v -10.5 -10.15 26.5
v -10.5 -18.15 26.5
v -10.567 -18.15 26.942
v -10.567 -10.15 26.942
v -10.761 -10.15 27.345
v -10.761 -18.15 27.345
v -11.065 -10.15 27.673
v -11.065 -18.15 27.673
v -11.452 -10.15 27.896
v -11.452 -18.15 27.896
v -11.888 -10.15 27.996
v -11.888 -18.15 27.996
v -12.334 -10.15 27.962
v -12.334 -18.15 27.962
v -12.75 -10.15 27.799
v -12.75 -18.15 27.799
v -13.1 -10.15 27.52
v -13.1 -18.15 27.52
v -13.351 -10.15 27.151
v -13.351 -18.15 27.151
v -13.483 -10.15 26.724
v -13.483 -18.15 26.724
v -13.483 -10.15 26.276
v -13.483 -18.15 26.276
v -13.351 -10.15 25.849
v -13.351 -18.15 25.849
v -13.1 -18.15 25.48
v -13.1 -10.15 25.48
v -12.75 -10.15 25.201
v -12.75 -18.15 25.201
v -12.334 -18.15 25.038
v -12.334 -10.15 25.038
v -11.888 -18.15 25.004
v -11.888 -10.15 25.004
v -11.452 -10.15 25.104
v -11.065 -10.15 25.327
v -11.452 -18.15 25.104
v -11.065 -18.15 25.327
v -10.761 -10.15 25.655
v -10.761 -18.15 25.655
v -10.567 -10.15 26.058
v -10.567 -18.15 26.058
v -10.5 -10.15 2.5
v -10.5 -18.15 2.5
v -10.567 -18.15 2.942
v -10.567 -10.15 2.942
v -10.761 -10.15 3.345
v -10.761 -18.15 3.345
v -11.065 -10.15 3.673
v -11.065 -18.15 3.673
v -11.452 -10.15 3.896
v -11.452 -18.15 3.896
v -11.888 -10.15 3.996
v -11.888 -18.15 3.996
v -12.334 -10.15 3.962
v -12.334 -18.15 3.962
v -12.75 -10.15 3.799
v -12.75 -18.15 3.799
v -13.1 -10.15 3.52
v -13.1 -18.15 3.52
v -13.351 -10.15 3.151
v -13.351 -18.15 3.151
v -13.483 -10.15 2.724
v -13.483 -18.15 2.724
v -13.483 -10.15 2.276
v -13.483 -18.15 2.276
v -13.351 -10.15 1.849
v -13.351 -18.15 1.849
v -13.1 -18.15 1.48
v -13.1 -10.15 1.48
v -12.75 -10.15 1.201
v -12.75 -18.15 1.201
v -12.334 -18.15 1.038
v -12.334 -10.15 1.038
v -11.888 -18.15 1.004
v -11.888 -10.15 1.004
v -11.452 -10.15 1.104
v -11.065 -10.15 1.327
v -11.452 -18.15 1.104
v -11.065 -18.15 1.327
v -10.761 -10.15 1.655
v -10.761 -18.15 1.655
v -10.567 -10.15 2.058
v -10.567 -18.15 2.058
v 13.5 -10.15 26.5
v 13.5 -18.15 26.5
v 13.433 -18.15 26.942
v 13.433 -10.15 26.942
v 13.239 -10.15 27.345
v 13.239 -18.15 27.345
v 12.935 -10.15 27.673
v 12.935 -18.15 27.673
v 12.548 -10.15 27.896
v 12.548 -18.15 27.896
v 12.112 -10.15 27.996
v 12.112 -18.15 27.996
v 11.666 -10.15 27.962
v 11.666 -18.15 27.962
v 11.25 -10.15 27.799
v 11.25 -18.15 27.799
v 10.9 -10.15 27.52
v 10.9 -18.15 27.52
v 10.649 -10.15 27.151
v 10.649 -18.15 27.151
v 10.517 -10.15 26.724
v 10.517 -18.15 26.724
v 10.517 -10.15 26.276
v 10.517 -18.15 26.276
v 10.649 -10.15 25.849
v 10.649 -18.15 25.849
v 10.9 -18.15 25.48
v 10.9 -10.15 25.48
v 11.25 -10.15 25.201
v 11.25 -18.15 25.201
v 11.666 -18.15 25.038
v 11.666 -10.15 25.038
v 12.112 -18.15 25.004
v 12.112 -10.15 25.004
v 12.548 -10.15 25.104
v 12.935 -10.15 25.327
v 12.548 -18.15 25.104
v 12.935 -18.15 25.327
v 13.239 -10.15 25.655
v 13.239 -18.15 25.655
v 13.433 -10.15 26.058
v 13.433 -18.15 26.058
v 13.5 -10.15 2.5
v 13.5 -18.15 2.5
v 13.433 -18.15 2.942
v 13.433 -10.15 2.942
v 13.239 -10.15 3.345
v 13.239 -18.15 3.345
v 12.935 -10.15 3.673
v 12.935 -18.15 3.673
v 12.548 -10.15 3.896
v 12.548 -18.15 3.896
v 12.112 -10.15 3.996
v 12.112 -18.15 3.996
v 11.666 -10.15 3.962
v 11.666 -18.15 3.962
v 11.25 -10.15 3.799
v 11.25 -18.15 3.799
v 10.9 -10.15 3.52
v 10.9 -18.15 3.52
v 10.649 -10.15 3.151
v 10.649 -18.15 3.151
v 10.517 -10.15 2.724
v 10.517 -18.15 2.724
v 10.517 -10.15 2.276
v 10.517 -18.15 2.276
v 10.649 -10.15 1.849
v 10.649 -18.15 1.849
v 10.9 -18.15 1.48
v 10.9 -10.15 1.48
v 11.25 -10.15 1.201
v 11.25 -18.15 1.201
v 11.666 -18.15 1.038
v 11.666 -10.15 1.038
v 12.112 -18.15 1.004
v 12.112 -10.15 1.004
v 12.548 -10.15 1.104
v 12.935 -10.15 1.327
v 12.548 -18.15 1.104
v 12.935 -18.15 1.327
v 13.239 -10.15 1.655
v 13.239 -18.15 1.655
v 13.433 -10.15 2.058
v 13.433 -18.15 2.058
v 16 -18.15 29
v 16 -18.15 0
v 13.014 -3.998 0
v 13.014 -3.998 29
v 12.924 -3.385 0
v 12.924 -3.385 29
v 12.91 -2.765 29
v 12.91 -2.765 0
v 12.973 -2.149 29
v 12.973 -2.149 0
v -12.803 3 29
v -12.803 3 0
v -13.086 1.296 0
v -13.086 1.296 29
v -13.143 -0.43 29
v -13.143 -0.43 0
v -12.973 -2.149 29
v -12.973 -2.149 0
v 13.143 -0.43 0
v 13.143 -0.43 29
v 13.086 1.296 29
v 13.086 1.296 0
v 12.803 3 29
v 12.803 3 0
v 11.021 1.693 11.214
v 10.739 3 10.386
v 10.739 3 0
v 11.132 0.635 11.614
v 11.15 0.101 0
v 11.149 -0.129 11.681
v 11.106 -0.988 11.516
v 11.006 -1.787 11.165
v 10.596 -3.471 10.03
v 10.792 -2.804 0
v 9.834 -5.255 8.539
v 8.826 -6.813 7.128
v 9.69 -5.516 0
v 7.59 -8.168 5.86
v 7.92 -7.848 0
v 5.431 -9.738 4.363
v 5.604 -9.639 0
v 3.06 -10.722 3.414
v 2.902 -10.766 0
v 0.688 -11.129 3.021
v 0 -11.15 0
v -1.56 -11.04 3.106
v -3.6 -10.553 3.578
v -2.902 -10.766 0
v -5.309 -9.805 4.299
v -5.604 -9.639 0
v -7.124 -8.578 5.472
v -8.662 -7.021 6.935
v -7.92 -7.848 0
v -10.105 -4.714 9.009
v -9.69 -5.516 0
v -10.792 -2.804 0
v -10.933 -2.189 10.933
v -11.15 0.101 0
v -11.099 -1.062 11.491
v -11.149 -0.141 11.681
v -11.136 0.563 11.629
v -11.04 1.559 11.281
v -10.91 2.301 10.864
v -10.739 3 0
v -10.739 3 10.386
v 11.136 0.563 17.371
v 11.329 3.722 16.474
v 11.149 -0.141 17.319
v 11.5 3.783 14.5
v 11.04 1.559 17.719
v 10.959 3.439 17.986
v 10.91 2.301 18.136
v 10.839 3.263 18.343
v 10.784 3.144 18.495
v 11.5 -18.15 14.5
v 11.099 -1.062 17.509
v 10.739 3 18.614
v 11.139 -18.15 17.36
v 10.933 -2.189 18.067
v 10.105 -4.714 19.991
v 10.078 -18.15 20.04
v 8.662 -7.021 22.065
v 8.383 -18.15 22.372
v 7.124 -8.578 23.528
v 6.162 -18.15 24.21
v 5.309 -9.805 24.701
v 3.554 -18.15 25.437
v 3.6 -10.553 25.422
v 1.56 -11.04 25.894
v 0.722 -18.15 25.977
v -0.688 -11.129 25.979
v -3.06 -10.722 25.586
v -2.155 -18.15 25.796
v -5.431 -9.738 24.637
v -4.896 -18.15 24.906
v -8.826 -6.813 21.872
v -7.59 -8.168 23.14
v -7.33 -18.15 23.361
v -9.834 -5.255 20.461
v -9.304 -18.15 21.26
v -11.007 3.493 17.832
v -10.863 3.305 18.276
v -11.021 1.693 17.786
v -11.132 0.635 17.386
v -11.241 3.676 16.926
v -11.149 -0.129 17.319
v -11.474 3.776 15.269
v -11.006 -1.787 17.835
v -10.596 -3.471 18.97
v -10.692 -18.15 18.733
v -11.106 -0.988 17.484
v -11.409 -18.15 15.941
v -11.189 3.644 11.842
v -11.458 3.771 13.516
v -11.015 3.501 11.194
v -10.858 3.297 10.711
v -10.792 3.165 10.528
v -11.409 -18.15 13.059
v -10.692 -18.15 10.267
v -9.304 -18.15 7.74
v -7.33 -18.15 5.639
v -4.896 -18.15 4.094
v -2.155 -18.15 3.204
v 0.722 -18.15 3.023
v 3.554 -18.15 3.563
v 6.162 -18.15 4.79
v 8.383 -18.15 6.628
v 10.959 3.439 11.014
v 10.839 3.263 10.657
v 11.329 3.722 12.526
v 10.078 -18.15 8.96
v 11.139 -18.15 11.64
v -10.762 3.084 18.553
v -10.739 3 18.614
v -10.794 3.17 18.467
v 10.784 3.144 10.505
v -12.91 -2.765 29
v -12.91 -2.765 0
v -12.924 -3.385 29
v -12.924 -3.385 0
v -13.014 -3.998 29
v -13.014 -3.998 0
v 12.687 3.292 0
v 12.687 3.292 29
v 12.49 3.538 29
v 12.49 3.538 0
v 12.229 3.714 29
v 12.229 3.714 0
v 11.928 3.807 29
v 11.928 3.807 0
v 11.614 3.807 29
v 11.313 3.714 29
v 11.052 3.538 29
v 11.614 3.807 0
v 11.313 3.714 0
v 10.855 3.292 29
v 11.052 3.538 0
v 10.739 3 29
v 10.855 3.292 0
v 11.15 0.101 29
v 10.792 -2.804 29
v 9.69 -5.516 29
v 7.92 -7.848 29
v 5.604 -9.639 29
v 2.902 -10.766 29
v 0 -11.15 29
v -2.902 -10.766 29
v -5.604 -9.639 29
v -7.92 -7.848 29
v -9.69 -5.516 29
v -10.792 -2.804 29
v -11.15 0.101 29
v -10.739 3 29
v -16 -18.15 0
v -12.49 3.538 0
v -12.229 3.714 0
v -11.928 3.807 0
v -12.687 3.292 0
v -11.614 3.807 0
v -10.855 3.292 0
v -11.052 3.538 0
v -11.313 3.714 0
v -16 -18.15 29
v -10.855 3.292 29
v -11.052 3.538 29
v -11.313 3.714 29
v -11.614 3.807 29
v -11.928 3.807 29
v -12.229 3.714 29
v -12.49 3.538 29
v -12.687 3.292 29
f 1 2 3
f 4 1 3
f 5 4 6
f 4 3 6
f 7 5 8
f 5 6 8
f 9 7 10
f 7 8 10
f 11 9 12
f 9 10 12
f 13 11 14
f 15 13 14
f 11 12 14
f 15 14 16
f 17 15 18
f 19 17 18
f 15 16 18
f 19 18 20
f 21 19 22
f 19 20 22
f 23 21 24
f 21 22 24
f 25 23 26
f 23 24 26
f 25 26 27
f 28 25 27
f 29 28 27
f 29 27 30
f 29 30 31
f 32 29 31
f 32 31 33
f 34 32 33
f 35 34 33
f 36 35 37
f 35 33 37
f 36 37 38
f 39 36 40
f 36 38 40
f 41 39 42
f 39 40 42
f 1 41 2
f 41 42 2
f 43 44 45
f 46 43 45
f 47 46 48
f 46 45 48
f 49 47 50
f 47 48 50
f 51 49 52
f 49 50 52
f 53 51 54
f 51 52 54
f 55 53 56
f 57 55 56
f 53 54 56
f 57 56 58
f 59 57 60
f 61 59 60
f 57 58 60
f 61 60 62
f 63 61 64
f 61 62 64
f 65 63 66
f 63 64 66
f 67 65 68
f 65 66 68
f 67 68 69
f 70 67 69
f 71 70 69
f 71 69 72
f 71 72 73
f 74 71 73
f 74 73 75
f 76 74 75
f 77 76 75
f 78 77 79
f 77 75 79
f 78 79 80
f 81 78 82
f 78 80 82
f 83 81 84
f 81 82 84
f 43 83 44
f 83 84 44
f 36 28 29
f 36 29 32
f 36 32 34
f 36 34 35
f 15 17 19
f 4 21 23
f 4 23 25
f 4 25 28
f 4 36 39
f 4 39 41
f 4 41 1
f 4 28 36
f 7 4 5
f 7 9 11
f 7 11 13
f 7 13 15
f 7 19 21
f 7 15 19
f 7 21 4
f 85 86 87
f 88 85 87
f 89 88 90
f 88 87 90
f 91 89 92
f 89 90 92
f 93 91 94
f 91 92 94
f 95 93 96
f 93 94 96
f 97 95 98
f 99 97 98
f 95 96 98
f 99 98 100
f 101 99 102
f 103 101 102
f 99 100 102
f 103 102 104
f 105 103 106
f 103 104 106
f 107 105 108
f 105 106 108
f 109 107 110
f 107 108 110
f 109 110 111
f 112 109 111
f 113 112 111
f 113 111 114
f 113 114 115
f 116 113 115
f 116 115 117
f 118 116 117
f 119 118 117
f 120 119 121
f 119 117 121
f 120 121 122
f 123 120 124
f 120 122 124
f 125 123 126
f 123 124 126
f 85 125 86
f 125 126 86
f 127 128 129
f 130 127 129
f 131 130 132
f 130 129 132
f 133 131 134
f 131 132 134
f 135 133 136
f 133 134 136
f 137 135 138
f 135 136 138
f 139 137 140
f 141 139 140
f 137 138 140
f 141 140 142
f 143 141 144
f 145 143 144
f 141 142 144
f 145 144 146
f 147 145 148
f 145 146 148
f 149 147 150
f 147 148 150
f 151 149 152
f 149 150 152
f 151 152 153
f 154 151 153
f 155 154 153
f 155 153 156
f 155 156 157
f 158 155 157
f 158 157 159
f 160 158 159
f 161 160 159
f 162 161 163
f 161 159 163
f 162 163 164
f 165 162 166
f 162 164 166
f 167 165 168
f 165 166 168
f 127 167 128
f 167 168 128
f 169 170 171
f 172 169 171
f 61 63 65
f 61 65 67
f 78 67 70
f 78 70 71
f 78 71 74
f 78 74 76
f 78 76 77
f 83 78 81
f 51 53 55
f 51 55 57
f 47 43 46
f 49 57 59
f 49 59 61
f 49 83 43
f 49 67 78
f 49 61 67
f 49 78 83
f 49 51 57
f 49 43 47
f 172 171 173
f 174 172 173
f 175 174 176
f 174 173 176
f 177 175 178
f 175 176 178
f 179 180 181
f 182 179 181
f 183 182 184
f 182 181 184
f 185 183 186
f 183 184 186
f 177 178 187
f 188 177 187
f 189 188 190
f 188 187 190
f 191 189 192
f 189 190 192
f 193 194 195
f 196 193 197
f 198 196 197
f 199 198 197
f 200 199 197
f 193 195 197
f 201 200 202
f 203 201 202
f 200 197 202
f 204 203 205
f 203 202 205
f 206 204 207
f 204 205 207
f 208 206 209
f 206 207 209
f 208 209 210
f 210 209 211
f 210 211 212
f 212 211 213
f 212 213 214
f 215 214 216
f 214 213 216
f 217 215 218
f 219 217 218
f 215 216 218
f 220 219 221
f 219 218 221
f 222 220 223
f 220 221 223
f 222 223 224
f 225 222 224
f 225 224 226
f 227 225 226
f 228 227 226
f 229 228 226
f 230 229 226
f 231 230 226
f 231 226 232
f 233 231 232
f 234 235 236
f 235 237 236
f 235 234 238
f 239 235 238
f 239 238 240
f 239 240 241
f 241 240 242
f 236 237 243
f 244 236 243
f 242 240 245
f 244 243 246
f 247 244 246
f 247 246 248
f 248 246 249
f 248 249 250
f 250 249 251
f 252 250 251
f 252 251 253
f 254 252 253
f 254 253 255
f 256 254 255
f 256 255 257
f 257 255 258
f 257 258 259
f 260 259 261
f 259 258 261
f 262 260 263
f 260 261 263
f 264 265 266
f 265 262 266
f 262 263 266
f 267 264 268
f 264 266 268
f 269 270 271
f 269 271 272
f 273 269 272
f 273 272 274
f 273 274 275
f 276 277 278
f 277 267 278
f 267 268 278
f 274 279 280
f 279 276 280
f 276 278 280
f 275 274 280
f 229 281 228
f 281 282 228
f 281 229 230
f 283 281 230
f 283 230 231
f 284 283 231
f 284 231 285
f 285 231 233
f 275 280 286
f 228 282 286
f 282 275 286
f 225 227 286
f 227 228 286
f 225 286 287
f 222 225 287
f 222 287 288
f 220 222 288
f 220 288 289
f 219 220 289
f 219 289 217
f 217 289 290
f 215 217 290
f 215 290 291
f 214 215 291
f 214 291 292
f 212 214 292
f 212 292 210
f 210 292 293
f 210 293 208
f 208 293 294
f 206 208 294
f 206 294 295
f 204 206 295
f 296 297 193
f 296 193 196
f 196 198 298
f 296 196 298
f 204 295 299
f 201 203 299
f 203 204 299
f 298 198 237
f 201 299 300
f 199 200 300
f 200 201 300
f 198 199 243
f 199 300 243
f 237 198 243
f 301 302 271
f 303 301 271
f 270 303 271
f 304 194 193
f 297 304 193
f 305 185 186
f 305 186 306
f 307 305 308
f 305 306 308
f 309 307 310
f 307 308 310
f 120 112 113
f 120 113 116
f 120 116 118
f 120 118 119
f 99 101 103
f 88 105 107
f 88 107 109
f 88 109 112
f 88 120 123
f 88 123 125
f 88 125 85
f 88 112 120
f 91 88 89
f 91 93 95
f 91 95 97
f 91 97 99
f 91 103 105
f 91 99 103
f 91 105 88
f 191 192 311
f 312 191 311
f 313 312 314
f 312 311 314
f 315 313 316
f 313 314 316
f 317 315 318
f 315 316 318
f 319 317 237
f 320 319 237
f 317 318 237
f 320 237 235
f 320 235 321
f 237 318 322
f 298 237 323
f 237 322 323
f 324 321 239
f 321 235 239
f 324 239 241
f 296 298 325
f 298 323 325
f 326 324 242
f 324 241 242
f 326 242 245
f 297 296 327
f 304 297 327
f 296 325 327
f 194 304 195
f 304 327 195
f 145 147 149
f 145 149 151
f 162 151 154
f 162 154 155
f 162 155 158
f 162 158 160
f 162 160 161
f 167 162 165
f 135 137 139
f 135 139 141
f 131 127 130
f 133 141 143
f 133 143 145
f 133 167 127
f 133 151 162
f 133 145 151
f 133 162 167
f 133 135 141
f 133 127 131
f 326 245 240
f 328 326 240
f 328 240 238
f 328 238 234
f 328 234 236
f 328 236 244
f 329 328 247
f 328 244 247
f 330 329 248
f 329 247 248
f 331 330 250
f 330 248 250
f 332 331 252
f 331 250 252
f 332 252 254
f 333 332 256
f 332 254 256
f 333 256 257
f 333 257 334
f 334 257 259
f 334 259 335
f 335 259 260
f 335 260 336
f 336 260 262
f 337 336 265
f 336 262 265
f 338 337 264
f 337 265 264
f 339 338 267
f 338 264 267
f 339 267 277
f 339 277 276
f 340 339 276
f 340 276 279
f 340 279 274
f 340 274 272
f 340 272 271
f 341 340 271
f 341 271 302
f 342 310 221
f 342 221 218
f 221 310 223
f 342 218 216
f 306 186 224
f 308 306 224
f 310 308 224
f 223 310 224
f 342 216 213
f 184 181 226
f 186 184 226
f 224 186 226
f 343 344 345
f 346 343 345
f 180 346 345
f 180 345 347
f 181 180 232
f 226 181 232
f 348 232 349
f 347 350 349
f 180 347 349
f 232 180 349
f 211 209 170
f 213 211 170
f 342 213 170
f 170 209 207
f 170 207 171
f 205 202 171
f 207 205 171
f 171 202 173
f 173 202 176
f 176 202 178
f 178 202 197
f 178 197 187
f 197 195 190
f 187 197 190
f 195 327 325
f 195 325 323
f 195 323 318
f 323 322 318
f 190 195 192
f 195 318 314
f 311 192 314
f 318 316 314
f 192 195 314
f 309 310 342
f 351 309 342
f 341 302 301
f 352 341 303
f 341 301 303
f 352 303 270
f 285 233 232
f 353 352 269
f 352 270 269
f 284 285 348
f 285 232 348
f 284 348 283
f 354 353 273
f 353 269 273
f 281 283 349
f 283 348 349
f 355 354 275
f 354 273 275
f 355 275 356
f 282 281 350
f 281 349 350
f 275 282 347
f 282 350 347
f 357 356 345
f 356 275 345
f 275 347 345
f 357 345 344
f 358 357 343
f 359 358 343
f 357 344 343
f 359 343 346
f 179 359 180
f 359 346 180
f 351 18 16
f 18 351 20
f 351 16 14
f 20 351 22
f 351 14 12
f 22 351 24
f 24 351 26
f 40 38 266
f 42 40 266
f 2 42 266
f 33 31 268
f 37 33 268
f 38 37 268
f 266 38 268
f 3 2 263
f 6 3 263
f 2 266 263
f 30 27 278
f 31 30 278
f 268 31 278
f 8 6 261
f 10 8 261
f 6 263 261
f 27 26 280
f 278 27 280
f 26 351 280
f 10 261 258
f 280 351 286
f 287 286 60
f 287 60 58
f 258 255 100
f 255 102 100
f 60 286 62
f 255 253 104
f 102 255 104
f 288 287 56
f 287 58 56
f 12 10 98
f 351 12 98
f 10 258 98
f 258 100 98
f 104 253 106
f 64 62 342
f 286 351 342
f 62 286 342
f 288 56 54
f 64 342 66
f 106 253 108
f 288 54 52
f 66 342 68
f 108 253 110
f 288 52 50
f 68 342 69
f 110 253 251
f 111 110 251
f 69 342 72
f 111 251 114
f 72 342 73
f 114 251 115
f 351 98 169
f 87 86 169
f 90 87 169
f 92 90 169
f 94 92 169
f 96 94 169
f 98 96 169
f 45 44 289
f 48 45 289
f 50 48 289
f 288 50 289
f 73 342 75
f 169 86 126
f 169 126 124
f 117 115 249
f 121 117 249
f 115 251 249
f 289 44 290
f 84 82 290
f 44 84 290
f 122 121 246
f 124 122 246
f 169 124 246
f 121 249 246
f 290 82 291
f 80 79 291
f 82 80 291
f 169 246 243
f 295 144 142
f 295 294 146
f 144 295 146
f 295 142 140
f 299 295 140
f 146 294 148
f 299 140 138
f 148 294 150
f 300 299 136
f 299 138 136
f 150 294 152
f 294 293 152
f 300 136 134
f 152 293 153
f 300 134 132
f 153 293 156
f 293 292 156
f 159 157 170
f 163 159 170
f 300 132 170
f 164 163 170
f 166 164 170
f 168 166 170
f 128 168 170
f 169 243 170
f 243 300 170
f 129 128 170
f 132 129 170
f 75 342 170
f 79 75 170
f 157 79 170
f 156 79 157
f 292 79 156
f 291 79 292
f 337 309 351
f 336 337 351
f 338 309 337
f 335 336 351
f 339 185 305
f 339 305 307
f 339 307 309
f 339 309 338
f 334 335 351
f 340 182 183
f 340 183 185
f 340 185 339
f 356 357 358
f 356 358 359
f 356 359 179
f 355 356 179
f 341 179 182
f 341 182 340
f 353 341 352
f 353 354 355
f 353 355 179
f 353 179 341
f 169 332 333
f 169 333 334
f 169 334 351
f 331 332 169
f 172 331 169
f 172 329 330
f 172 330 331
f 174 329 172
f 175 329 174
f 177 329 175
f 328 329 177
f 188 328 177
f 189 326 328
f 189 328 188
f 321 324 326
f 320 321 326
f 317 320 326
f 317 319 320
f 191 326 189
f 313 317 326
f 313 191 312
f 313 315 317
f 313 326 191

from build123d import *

# Parameters (mm, degrees)
F1_DEPTH = 29
F2_R     = 11.5
F3_DEPTH = 25
F2_R_2   = 1.5
F4_DEPTH = 8


# Not quite as in the source:
# - a feature names something its author has since deleted; it is built from what else it names


with BuildPart() as f1:
    # F0 (on Top) → F1 (new body)
    with BuildSketch(Plane.XY):
        with BuildLine():
            ThreePointArc((10.7388314076, 3), (0, -11.15), (-10.7388314076, 3))
            ThreePointArc((-10.7388314076, 3), (-11.7710268291, 3.8182927175), (-12.8032222507, 3))
            ThreePointArc((-12.8032222507, 3), (-13.142833705, 0.4340762628), (-12.9732702789, -2.148664299))
            ThreePointArc((-12.9732702789, -2.148664299), (-12.9072730339, -3.0752015435), (-13.0137997447, -3.9979577203))
            Line((-13.0137997447, -3.9979577203), (-16, -18.15))
            Line((-16, -18.15), (0, -18.15))
            Line((0, -18.15), (16, -18.15))
            Line((16, -18.15), (13.0137997447, -3.9979577203))
            ThreePointArc((13.0137997447, -3.9979577203), (12.9072730339, -3.0752015435), (12.9732702789, -2.148664299))
            ThreePointArc((12.9732702789, -2.148664299), (13.142833705, 0.4340762628), (12.8032222507, 3))
            ThreePointArc((12.8032222507, 3), (11.7710268291, 3.8182927175), (10.7388314076, 3))
        make_face()
    extrude(amount=F1_DEPTH)

    # F2 (on face) → F3 (cut)
    with BuildSketch(Plane.XZ.offset(18.15)):
        with Locations((0, 14.5)):
            Circle(F2_R)
    extrude(amount=-F3_DEPTH, mode=Mode.SUBTRACT)

    # F2 (on face) → F4 (cut)
    with BuildSketch(Plane.XZ.offset(18.15)):
        with Locations((-12, 26.5)):
            Circle(F2_R_2)
        with Locations((-12, 2.5)):
            Circle(F2_R_2)
        with Locations((12, 26.5)):
            Circle(F2_R_2)
        with Locations((12, 2.5)):
            Circle(F2_R_2)
    extrude(amount=-F4_DEPTH, mode=Mode.SUBTRACT)


solid = f1.part
